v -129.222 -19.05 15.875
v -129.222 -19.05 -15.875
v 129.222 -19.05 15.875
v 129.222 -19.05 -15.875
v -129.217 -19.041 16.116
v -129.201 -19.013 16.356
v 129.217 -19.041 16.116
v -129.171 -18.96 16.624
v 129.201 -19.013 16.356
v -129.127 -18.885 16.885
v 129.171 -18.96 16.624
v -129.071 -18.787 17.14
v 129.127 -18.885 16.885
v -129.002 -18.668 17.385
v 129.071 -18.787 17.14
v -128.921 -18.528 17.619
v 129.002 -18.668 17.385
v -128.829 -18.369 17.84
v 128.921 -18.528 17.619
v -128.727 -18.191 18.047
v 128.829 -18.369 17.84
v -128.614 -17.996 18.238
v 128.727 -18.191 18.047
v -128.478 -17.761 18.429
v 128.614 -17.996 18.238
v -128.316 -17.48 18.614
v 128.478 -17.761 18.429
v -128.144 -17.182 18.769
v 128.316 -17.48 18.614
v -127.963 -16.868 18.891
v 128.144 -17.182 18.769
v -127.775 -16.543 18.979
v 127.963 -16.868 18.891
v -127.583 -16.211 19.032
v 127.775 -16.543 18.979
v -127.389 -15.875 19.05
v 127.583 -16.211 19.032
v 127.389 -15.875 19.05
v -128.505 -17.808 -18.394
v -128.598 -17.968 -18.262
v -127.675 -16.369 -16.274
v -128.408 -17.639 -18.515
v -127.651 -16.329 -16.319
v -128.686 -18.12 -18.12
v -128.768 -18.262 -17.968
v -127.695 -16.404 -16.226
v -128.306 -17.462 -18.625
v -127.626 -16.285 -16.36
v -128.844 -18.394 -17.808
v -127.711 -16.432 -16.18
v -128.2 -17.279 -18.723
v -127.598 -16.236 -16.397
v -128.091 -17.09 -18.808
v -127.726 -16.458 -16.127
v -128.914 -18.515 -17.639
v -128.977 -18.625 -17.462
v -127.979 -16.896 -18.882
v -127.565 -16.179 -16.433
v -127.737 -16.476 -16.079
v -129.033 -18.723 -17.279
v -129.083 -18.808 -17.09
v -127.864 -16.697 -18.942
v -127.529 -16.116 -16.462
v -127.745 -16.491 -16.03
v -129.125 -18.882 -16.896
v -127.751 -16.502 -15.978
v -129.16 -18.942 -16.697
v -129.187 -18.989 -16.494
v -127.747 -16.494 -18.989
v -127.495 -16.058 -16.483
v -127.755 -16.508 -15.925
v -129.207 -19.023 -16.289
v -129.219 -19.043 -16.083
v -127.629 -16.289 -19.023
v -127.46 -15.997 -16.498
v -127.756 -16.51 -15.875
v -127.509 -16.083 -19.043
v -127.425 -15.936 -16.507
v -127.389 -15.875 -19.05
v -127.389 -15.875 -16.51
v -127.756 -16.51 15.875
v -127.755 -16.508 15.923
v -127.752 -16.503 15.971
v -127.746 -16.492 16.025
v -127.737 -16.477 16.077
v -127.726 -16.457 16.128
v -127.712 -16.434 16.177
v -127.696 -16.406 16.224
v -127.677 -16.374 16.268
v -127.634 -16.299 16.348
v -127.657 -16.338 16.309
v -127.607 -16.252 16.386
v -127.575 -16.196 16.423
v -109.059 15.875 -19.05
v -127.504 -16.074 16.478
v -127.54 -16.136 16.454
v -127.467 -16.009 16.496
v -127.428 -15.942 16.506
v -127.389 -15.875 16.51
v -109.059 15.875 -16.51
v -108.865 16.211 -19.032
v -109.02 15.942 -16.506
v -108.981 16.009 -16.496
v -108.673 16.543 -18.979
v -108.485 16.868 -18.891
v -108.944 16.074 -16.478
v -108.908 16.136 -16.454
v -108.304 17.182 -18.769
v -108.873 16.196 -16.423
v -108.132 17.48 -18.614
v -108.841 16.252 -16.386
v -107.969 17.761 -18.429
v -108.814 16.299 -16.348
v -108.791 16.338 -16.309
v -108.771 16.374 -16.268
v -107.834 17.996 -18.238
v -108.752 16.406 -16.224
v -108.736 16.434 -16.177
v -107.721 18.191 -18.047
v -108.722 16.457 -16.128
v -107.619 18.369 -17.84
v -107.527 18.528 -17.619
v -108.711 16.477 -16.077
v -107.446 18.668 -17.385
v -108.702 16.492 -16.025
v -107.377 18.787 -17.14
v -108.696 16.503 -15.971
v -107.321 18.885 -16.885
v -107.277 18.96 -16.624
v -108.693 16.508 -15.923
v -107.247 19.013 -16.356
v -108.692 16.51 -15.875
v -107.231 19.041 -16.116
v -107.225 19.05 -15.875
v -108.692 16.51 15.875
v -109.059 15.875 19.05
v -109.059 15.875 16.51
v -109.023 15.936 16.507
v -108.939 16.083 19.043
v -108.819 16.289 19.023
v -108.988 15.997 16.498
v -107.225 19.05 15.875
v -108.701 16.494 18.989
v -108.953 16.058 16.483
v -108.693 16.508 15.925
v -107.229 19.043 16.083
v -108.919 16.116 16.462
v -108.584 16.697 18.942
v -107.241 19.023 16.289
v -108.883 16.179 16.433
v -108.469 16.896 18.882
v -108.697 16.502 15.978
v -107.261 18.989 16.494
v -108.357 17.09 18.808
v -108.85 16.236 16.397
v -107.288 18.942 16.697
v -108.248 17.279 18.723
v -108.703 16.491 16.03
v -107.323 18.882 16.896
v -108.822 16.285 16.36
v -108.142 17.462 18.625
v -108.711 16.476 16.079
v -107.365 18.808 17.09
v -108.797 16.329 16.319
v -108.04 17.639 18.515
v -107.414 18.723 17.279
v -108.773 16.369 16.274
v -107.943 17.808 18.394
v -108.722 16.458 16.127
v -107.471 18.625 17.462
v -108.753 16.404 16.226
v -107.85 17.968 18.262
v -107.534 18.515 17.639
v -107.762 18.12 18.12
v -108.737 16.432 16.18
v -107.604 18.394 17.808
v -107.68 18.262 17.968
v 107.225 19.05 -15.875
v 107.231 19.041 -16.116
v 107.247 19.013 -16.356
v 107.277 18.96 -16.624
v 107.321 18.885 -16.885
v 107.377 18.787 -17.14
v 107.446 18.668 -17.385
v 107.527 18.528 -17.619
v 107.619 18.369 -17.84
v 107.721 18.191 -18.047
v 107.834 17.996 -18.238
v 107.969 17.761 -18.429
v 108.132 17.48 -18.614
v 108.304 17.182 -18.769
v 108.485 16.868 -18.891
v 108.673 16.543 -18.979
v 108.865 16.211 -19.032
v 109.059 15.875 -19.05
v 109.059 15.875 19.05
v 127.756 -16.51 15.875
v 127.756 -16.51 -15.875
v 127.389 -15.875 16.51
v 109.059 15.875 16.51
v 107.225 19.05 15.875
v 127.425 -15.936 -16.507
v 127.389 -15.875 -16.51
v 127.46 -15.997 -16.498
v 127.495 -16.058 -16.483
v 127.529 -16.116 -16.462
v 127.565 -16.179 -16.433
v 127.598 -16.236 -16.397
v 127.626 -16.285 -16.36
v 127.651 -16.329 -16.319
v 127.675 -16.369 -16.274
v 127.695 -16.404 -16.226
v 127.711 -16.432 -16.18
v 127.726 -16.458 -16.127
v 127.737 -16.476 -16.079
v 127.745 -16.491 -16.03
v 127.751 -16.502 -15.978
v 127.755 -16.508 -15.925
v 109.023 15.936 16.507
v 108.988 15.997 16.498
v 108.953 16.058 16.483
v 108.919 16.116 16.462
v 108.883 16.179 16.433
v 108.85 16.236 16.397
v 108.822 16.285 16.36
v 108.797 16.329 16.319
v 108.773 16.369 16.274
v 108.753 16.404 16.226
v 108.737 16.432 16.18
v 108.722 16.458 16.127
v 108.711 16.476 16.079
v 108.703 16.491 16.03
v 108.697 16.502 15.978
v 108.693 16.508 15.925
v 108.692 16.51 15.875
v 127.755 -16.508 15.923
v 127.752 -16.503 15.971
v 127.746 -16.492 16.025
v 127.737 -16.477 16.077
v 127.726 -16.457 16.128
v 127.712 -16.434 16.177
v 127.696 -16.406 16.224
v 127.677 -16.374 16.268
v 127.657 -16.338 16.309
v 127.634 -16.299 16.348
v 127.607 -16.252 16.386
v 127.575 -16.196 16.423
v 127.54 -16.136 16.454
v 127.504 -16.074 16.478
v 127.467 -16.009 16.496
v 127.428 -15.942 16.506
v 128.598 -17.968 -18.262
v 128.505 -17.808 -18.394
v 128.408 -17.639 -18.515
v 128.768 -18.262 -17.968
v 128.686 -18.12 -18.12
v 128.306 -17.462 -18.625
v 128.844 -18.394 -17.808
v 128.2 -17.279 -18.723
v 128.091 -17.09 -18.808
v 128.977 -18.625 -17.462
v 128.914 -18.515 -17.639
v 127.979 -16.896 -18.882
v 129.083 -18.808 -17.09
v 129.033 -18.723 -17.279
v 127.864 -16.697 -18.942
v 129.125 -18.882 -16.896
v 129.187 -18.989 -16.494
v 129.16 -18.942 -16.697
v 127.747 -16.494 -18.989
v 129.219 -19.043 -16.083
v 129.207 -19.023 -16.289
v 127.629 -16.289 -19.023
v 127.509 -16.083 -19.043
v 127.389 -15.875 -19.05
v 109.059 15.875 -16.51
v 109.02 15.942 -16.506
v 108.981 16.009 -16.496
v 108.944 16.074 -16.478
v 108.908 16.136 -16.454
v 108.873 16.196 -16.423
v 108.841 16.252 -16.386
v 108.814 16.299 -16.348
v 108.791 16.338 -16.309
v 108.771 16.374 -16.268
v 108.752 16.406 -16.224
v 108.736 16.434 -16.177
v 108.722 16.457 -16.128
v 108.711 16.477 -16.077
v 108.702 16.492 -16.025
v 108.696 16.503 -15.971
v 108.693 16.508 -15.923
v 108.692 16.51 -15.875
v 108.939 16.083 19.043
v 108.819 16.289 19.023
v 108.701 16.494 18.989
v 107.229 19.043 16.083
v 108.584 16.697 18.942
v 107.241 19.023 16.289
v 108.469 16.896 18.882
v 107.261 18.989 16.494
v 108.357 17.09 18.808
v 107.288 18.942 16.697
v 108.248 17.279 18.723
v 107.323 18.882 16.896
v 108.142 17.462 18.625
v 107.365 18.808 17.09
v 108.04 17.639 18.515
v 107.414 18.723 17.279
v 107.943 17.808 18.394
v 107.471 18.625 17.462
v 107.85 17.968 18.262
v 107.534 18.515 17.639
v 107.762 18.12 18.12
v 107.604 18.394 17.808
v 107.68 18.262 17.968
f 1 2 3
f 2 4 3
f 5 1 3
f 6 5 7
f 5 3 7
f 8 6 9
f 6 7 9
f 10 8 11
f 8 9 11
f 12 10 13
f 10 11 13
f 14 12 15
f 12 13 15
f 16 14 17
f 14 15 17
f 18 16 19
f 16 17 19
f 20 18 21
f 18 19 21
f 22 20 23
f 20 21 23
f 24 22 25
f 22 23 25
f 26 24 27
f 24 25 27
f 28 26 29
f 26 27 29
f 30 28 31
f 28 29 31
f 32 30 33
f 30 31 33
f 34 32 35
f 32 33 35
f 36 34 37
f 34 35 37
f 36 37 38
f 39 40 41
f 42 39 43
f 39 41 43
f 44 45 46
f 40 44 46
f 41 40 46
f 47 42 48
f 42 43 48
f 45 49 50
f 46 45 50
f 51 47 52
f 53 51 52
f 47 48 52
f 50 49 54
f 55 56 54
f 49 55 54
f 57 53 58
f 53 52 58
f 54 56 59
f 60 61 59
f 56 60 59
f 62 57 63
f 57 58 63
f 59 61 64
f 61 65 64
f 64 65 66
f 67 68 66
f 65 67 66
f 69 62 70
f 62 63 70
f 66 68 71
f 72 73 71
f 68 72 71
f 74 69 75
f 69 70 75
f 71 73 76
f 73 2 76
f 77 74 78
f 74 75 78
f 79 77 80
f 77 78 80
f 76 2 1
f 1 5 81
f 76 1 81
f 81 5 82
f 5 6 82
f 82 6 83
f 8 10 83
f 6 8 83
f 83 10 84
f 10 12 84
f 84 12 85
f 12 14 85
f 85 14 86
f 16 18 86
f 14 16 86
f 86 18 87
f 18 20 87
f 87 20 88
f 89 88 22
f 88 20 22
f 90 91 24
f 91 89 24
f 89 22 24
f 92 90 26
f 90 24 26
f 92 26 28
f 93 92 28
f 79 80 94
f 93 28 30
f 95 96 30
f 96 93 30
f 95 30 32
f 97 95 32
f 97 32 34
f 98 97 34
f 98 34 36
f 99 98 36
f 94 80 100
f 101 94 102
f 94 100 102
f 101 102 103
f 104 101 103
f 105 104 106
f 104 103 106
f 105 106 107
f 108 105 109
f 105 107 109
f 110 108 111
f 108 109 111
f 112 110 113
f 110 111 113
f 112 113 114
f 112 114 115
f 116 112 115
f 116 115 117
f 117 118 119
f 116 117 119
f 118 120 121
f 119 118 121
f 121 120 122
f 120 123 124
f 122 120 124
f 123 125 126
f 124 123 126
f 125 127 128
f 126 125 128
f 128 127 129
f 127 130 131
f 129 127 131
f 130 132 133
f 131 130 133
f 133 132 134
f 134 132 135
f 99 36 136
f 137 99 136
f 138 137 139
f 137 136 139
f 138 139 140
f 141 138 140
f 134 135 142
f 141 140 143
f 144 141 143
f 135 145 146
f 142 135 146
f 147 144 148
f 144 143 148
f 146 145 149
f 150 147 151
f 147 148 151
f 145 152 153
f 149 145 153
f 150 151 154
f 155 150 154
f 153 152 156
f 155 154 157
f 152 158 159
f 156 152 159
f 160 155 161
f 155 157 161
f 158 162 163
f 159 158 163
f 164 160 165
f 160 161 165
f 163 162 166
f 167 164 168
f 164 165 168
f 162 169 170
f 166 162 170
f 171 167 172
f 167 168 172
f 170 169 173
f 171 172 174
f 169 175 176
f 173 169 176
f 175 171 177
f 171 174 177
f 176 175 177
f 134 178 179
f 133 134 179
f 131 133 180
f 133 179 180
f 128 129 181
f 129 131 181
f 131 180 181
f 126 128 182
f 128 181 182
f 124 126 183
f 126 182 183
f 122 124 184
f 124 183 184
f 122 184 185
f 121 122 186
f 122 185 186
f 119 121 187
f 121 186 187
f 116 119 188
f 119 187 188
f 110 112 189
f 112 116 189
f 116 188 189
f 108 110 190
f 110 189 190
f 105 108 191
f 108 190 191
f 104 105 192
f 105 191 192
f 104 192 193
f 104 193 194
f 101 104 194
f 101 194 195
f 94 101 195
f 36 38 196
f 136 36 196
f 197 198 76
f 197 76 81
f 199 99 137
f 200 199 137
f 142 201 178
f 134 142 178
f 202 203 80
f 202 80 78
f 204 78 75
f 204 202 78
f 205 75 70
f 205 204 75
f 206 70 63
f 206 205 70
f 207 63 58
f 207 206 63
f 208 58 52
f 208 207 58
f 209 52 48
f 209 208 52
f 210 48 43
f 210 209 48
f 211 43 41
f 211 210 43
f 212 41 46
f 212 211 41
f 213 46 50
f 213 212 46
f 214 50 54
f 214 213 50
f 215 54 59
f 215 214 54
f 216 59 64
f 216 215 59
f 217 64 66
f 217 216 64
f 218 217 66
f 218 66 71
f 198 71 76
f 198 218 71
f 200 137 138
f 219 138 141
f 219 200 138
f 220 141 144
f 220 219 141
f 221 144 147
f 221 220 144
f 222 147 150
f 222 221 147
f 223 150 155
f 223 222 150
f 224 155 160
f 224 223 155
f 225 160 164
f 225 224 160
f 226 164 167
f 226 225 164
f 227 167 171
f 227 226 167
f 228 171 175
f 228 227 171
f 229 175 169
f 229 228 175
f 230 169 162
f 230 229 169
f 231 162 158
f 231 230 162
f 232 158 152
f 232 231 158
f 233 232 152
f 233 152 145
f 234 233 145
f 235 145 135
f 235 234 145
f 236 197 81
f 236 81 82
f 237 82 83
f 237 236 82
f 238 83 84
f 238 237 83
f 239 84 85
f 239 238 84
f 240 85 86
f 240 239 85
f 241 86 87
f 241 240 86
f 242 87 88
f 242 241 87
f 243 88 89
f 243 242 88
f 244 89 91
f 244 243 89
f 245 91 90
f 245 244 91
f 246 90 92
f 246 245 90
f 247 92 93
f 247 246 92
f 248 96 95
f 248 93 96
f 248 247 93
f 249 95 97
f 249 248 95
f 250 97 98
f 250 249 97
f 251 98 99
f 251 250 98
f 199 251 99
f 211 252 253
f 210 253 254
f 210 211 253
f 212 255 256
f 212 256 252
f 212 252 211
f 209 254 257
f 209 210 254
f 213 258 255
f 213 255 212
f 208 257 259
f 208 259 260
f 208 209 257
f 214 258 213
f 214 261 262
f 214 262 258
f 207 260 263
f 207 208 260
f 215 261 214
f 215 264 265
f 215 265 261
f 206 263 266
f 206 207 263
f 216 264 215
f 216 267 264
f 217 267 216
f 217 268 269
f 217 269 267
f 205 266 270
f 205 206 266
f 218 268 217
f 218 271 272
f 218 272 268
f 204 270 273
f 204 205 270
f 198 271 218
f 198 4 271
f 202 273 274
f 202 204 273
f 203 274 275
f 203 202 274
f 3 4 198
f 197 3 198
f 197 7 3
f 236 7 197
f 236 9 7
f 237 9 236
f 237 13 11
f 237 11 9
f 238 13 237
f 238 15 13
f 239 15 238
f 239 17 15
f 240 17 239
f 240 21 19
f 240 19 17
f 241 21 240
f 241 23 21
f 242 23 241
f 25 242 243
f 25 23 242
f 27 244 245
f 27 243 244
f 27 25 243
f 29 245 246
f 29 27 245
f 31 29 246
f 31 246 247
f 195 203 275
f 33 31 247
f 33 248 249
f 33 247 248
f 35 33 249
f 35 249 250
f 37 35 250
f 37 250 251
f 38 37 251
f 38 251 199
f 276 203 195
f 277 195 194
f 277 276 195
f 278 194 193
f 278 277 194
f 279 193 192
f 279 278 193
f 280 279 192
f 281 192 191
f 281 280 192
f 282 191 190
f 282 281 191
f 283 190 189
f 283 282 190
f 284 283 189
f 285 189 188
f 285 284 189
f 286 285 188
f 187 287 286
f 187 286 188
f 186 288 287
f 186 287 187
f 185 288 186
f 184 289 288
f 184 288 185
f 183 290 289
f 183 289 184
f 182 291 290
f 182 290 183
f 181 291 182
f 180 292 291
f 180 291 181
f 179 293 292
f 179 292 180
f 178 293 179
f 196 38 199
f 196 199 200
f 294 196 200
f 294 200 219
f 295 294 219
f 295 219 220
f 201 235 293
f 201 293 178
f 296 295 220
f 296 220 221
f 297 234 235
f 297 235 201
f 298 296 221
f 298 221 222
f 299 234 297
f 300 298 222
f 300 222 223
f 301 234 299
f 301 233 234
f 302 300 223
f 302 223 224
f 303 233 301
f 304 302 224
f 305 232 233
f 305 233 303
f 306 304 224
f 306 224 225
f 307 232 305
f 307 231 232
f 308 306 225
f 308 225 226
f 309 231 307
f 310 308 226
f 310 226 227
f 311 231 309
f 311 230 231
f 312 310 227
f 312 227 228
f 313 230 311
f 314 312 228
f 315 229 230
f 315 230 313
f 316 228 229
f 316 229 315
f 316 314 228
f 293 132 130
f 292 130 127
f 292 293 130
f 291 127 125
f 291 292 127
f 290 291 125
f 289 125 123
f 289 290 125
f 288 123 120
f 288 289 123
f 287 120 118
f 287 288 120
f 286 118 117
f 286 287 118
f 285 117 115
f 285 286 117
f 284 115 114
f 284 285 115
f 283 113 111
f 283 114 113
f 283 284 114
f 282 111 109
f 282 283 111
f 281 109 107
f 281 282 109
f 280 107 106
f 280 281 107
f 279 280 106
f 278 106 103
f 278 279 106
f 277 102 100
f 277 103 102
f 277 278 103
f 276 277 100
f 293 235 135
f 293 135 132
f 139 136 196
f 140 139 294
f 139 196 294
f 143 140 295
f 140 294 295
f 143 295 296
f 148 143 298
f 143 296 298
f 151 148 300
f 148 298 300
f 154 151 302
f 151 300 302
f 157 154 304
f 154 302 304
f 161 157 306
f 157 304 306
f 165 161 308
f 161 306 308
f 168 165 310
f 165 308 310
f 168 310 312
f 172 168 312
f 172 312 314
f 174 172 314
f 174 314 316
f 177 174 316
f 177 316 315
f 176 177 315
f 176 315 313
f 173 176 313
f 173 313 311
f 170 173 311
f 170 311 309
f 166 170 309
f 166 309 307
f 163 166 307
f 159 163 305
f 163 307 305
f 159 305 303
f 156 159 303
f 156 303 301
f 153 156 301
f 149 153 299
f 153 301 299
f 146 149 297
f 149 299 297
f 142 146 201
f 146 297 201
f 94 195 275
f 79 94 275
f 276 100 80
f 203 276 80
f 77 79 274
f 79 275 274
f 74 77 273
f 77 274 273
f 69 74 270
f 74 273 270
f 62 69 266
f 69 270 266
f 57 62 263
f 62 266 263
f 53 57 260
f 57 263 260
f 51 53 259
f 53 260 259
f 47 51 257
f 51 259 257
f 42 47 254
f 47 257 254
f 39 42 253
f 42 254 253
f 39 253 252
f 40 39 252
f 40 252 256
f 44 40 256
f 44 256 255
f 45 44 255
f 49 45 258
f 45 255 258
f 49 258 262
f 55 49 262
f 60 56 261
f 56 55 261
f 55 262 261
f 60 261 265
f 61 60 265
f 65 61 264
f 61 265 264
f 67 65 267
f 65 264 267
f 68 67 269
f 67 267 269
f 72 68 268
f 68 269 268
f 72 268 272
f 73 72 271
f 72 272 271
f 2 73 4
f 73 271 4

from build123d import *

# Parameters (mm, degrees)
EXTRUDE_THIN1_DEPTH     = 129.2225
CUT_EXTRUDE1_DEPTH      = 1
CUT_EXTRUDE1_DEPTH_BACK = 39.1
CUT_EXTRUDE2_DEPTH      = 1
CUT_EXTRUDE2_DEPTH_BACK = 39.1


with BuildPart() as part:
    # Sketch1 → Extrude-Thin1 (new body, symmetric)
    with BuildSketch(Plane(origin=(0, 0, 0), x_dir=(0, 0, -1), z_dir=(1, 0, 0))):
        with BuildLine():
            Line((-15.875, 19.05), (15.875, 19.05))
            ThreePointArc((15.875, 19.05), (18.12006403, 18.12006403), (19.05, 15.875))
            Line((19.05, 15.875), (19.05, -15.875))
            ThreePointArc((19.05, -15.875), (18.12006403, -18.12006403), (15.875, -19.05))
            Line((15.875, -19.05), (-15.875, -19.05))
            ThreePointArc((-15.875, -19.05), (-18.12006403, -18.12006403), (-19.05, -15.875))
            Line((-19.05, -15.875), (-19.05, 15.875))
            ThreePointArc((-19.05, 15.875), (-18.12006403, 18.12006403), (-15.875, 19.05))
        make_face()
        with BuildLine():
            Line((-15.875, 16.51), (15.875, 16.51))
            ThreePointArc((15.875, 16.51), (16.324012806, 16.324012806), (16.51, 15.875))
            Line((16.51, 15.875), (16.51, -15.875))
            ThreePointArc((16.51, -15.875), (16.324012806, -16.324012806), (15.875, -16.51))
            Line((15.875, -16.51), (-15.875, -16.51))
            ThreePointArc((-15.875, -16.51), (-16.324012806, -16.324012806), (-16.51, -15.875))
            Line((-16.51, -15.875), (-16.51, 15.875))
            ThreePointArc((-16.51, 15.875), (-16.324012806, 16.324012806), (-15.875, 16.51))
        make_face(mode=Mode.SUBTRACT)
    extrude(amount=EXTRUDE_THIN1_DEPTH, both=True)

    # Sketch2 → Cut-Extrude1 (cut, two sides)
    with BuildSketch(Plane.XY.offset(19.05)) as cut_extrude1_sk:
        Polygon((-395.460759114, -480.188191704), (-129.2225, -19.05), (-107.225454744, 19.05), (159.01280437, 480.188191704), (-763.263579039, 1012.664709933), (-1317.737142523, 52.288326524), align=None)
    extrude(amount=CUT_EXTRUDE1_DEPTH, mode=Mode.SUBTRACT)
    extrude(cut_extrude1_sk.sketch, amount=-CUT_EXTRUDE1_DEPTH_BACK, mode=Mode.SUBTRACT)

    # Sketch3 → Cut-Extrude2 (cut, two sides)
    with BuildSketch(Plane.XY.offset(19.05)) as cut_extrude2_sk:
        Polygon((395.460759114, -480.188191704), (129.2225, -19.05), (107.225454744, 19.05), (-159.01280437, 480.188191704), (763.263579039, 1012.664709933), (1317.737142523, 52.288326524), align=None)
    extrude(amount=CUT_EXTRUDE2_DEPTH, mode=Mode.SUBTRACT)
    extrude(cut_extrude2_sk.sketch, amount=-CUT_EXTRUDE2_DEPTH_BACK, mode=Mode.SUBTRACT)


solid = part.part
